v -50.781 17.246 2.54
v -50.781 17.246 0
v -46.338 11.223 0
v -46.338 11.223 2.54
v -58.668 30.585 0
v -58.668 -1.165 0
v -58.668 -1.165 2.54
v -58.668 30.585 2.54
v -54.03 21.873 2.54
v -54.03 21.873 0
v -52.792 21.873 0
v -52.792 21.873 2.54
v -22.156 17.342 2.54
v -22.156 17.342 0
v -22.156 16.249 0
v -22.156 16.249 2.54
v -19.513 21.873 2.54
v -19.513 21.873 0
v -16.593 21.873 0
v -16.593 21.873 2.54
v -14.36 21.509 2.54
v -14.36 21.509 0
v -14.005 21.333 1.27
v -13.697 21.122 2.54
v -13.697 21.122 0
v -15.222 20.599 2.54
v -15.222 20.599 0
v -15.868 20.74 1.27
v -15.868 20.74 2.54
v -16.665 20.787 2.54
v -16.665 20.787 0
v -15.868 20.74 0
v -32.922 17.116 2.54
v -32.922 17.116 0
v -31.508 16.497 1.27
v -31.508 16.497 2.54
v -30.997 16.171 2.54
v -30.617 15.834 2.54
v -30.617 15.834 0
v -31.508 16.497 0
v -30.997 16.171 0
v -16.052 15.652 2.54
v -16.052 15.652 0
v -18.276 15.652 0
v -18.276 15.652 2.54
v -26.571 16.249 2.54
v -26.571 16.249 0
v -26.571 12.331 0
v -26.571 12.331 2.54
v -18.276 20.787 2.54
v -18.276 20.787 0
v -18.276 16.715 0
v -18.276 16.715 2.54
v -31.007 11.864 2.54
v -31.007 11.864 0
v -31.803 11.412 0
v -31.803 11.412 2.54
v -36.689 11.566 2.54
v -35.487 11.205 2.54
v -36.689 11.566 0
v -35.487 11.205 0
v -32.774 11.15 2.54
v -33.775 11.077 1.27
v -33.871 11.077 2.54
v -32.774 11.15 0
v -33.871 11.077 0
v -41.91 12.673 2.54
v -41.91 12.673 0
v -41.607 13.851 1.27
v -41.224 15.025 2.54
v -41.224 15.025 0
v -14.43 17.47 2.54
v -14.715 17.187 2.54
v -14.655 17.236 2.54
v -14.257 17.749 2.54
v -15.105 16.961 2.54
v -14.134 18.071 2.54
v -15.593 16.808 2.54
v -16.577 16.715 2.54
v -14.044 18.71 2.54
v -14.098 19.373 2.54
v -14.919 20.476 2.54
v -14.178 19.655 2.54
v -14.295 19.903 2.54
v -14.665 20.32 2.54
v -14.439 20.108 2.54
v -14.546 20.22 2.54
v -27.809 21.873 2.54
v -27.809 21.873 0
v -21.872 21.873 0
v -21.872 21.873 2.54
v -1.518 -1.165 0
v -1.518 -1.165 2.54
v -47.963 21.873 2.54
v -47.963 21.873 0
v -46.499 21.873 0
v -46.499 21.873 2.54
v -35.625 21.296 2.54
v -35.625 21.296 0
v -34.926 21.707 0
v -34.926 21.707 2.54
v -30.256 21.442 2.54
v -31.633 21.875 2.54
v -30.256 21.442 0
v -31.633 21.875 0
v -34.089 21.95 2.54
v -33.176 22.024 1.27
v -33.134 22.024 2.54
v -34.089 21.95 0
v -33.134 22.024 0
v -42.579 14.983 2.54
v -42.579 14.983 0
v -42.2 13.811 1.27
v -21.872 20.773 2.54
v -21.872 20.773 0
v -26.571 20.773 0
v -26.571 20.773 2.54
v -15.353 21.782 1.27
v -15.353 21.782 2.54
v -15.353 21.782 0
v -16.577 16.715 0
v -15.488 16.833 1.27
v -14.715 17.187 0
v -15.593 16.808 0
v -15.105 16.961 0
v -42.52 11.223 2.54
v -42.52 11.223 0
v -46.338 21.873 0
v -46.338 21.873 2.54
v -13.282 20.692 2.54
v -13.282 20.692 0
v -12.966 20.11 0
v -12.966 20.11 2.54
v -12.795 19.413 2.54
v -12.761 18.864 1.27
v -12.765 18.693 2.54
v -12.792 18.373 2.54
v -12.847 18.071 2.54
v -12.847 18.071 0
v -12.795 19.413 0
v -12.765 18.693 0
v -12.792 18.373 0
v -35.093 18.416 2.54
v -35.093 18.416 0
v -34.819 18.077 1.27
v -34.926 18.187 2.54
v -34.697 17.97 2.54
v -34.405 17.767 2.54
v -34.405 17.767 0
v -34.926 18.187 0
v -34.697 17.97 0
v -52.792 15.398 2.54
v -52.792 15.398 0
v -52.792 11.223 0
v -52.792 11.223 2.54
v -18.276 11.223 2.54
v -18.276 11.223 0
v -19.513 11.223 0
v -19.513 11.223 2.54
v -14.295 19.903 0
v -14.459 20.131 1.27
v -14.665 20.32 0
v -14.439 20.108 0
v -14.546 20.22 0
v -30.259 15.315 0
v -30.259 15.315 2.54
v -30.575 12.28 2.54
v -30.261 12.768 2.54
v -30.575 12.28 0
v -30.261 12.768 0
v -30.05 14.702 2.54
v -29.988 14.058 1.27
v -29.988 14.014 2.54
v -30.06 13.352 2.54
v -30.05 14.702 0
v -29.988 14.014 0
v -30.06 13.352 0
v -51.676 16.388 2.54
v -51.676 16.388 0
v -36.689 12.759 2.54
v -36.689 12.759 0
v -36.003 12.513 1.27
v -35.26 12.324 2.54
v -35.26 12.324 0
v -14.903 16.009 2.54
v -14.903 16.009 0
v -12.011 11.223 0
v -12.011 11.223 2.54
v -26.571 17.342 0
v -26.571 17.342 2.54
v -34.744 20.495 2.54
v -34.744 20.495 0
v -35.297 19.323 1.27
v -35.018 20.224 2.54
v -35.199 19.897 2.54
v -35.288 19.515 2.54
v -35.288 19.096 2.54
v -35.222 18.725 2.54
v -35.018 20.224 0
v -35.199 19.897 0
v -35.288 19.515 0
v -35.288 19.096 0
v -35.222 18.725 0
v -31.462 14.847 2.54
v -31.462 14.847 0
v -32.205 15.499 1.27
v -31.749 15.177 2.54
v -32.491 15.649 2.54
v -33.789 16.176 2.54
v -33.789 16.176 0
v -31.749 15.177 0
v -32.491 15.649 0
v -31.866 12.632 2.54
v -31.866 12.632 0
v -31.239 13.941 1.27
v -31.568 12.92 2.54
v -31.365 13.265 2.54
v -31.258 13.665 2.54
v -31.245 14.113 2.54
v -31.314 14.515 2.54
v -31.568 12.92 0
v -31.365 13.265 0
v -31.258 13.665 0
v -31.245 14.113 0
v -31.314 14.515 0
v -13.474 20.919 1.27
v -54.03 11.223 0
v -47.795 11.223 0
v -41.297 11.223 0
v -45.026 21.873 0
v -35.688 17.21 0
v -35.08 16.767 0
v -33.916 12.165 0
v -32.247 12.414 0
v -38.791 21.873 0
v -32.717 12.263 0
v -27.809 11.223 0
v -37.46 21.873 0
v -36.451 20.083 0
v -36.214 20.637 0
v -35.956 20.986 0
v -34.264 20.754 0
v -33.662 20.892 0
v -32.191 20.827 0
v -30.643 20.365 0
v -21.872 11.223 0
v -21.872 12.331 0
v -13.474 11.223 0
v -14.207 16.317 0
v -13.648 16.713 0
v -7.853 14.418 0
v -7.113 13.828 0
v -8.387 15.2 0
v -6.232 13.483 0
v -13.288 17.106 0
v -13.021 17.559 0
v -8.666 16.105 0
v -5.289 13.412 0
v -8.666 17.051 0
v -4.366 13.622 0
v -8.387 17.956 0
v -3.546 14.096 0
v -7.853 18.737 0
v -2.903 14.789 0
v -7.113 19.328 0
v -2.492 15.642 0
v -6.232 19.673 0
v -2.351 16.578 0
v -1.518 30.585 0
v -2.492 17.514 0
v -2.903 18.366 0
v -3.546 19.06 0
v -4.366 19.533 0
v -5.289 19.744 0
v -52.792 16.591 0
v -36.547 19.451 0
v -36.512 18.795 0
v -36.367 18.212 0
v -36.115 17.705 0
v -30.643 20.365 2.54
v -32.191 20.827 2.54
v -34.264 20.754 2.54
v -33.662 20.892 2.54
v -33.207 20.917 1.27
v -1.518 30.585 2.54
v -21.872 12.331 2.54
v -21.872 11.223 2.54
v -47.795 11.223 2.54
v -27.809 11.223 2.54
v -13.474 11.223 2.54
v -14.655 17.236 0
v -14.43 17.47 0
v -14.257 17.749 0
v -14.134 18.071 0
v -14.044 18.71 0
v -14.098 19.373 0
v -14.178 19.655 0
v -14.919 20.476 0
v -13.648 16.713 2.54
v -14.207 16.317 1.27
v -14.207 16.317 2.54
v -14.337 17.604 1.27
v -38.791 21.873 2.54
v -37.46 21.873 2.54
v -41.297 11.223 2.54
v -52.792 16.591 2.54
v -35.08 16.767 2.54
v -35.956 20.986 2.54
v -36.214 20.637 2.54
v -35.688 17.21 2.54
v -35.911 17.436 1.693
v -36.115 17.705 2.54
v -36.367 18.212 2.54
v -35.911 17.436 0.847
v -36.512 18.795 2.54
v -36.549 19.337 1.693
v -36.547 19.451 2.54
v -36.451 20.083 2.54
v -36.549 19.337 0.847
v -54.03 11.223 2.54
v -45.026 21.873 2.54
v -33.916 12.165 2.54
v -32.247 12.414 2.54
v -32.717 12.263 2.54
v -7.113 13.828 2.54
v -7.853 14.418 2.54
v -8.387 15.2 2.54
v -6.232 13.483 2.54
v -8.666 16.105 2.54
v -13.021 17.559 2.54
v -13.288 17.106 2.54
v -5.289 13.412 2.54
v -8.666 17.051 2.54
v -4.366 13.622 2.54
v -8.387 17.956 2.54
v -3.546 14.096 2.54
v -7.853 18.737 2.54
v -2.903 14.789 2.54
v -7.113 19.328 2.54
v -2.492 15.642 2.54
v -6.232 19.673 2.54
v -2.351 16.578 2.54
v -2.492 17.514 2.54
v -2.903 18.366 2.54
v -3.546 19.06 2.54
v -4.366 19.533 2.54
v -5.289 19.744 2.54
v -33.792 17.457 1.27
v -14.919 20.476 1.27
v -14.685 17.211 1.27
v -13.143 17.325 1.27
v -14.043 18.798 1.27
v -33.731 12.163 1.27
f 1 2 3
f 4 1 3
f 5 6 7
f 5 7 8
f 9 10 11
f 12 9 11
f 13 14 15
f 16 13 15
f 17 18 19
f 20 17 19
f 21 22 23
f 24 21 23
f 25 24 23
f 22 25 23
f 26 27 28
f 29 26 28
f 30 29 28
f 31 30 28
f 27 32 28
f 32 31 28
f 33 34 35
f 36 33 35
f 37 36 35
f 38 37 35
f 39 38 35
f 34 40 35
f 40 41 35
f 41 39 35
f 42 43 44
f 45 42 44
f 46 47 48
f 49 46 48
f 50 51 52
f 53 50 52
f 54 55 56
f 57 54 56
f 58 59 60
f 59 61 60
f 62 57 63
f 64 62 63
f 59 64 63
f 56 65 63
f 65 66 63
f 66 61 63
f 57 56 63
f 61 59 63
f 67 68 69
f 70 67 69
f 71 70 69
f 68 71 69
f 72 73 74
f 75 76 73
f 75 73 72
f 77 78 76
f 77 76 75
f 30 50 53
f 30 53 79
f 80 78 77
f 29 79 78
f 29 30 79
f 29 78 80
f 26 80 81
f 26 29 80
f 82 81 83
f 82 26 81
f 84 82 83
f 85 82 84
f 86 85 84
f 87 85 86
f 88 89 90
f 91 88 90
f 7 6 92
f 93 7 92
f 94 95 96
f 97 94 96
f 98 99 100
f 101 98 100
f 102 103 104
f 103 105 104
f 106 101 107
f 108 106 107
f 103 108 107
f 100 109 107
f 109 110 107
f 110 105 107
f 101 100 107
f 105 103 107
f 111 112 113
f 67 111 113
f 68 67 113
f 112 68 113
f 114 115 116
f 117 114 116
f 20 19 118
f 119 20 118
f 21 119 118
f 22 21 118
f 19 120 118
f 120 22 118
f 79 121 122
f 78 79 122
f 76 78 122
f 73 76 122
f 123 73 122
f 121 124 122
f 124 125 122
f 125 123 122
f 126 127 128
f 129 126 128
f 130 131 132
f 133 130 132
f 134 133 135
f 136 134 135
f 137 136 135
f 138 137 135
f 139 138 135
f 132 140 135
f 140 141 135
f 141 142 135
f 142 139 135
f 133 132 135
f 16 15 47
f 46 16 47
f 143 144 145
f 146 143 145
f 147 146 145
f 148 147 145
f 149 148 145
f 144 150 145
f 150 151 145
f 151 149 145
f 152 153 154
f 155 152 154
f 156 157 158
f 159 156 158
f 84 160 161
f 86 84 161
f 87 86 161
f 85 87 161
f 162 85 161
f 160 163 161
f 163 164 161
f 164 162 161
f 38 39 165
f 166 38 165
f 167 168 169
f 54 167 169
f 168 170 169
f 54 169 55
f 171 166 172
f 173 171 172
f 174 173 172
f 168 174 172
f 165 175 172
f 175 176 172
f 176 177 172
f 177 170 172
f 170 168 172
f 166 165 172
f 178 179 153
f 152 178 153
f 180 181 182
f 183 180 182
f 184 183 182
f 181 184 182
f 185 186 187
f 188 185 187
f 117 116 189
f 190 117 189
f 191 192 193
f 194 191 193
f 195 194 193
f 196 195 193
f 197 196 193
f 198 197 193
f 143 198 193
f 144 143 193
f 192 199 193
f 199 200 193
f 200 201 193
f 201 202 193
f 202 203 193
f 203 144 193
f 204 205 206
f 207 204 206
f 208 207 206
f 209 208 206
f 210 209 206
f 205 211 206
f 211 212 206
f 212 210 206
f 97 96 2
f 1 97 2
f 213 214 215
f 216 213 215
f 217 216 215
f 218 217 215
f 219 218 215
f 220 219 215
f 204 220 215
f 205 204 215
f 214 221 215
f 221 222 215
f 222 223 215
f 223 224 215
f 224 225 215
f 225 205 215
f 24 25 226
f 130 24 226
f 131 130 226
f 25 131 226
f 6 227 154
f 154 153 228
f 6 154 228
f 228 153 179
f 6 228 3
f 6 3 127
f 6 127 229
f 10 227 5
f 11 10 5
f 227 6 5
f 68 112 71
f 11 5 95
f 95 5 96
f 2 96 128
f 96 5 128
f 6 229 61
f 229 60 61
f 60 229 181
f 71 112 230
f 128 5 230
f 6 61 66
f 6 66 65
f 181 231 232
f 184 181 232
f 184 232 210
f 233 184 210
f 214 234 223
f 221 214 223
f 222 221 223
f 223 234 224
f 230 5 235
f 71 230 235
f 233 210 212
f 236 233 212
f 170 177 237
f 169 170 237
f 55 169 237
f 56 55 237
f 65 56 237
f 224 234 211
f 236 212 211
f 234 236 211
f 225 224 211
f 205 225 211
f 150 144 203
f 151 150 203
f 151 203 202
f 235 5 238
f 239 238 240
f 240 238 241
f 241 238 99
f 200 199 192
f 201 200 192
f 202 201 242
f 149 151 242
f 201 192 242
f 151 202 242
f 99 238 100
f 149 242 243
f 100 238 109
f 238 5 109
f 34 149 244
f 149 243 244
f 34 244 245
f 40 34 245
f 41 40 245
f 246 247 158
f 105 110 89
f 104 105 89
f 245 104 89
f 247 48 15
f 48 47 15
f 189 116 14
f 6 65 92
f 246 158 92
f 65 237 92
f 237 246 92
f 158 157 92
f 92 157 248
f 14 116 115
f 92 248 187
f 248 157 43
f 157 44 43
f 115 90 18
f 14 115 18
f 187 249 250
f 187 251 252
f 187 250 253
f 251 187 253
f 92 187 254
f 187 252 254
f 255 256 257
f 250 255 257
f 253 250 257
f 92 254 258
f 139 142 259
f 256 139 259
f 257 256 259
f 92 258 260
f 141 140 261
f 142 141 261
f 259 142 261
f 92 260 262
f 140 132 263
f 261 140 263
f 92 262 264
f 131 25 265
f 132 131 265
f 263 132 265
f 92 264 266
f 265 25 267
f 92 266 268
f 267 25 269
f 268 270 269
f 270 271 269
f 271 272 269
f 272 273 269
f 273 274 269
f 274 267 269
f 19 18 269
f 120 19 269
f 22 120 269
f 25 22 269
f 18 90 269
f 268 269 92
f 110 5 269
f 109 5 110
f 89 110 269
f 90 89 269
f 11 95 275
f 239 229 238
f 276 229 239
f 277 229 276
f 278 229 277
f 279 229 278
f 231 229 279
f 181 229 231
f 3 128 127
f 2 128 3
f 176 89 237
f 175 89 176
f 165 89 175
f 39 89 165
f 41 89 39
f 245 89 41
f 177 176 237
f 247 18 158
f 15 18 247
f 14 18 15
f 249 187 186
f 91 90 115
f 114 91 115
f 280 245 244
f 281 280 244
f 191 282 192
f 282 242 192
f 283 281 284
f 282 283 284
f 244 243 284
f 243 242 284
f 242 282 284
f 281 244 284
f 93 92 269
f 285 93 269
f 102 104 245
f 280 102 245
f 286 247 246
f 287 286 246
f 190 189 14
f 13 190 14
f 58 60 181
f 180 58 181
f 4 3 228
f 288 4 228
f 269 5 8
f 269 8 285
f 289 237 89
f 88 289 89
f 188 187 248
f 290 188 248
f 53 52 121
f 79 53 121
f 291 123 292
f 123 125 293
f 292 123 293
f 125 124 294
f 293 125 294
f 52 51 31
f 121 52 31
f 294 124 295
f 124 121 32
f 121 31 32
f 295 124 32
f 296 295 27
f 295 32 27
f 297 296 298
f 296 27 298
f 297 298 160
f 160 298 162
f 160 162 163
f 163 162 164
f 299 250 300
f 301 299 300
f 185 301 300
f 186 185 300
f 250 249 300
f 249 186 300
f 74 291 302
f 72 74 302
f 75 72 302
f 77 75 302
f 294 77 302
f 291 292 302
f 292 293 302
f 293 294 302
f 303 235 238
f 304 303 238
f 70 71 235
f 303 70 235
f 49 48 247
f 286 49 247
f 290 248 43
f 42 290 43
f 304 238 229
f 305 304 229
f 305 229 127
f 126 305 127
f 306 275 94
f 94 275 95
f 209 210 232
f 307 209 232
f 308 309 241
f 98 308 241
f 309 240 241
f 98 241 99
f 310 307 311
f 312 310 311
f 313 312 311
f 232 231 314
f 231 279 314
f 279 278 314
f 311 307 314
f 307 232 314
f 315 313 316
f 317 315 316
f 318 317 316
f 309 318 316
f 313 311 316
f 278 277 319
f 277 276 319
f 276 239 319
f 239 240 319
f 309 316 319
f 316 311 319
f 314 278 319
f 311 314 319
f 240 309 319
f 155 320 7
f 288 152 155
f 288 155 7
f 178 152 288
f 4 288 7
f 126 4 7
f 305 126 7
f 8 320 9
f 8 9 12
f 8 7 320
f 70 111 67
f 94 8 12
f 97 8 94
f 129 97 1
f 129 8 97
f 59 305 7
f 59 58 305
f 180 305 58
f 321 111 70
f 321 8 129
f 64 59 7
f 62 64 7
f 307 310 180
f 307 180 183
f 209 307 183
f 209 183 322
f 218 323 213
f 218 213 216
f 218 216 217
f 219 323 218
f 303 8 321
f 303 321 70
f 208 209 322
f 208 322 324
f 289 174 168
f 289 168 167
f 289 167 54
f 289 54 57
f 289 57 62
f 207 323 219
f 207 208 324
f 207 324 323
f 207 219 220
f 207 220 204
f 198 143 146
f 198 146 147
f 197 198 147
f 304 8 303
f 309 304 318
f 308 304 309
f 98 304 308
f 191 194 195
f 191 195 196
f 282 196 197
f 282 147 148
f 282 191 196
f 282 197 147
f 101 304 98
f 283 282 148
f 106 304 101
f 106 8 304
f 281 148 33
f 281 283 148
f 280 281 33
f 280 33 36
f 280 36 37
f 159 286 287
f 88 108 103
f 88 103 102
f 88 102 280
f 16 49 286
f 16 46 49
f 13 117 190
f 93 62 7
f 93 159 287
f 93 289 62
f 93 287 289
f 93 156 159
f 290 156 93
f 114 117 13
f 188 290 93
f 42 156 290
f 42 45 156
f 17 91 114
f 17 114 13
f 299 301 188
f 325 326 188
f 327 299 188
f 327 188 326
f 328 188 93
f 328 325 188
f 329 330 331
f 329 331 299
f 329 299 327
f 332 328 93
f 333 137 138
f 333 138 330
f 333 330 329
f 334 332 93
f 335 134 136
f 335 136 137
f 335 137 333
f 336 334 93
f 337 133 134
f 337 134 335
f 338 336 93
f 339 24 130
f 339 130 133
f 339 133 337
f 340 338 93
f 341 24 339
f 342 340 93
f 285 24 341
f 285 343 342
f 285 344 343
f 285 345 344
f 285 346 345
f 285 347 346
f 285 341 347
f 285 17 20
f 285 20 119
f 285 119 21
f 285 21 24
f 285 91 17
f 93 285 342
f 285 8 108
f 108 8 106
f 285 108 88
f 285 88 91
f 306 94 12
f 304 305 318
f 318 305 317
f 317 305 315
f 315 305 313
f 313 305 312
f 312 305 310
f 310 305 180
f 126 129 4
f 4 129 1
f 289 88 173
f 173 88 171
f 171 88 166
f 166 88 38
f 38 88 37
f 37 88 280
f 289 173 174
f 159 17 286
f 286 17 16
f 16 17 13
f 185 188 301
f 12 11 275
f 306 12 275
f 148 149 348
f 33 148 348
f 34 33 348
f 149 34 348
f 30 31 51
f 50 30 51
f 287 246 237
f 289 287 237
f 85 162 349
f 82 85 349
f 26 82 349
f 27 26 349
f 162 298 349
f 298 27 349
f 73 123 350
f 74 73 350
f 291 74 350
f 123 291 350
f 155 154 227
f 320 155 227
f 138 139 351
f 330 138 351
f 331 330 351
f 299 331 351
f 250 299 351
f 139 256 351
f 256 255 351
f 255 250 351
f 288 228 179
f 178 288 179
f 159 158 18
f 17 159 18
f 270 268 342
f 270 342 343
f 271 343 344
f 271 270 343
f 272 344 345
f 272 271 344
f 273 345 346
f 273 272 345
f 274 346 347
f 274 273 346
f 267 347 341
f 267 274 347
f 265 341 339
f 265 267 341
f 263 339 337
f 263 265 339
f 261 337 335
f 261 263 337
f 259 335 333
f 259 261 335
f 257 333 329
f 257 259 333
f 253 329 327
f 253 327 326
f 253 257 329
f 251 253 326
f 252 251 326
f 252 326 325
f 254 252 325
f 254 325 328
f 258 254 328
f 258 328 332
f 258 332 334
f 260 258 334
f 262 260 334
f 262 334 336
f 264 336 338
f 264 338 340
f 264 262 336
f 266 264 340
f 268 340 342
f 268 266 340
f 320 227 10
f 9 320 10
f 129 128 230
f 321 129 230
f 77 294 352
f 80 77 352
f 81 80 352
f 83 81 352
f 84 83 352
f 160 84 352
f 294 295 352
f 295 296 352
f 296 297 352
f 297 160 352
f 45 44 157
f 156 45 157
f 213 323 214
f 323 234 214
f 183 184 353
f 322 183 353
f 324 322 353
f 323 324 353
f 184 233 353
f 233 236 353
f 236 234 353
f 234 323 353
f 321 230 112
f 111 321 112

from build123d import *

# Parameters (mm, degrees)
F1_DEPTH = 2.54
F0_W     = 57.15
F0_H     = 31.75
F0_R     = 3.175


with BuildPart() as f1:
    # F0 (on Top) → F1 (new body)
    with BuildSketch(Plane.XY):
        with BuildLine():
            Line((-18.2756781968, 20.786606901), (-18.2756781968, 19.4800253958))
            Line((-18.2756781968, 19.4800253958), (-18.2756781968, 18.3623470366))
            Line((-18.2756781968, 18.3623470366), (-18.2756781968, 16.7147622153))
            Line((-18.2756781968, 16.7147622153), (-16.5765512501, 16.7147622153))
            add(Edge.make_bspline(
                [(-16.5765512501, 16.7147622153), (-15.3293934084, 16.7147622153), (-14.7150388735, 17.1869877213)],
                knots=[0, 0, 0, 0.9521092994, 0.9521092994, 0.9521092994], degree=2))
            add(Edge.make_bspline(
                [(-14.7150388735, 17.1869877213), (-14.6841370967, 17.2107404673), (-14.6548363426, 17.2356879665)],
                knots=[0.9521092994, 0.9521092994, 0.9521092994, 1, 1, 1], degree=2))
            add(Edge.make_bspline(
                [(-14.6548363426, 17.2356879665), (-14.2795364488, 17.555229019), (-14.1344492538, 18.0707797408)],
                knots=[0, 0, 0, 0.613409976, 0.613409976, 0.613409976], degree=2))
            add(Edge.make_bspline(
                [(-14.1344492538, 18.0707797408), (-14.043010796, 18.3956958226), (-14.043010796, 18.7984652199)],
                knots=[0.613409976, 0.613409976, 0.613409976, 1, 1, 1], degree=2))
            add(Edge.make_bspline(
                [(-14.043010796, 18.7984652199), (-14.043010796, 19.4699240171), (-14.2946946146, 19.9028959001)],
                knots=[0, 0, 0, 0.6359498468, 0.6359498468, 0.6359498468], degree=2))
            add(Edge.make_bspline(
                [(-14.2946946146, 19.9028959001), (-14.4387712791, 20.1507511062), (-14.6653247806, 20.3204541035)],
                knots=[0.6359498468, 0.6359498468, 0.6359498468, 1, 1, 1], degree=2))
            add(Edge.make_bspline(
                [(-14.6653247806, 20.3204541035), (-14.8932302371, 20.4911698013), (-15.2224180123, 20.5993655494)],
                knots=[0, 0, 0, 0.3662226179, 0.3662226179, 0.3662226179], degree=2))
            add(Edge.make_bspline(
                [(-15.2224180123, 20.5993655494), (-15.7921036522, 20.786606901), (-16.6651202816, 20.786606901)],
                knots=[0.3662226179, 0.3662226179, 0.3662226179, 1, 1, 1], degree=2))
            Line((-16.6651202816, 20.786606901), (-18.2756781968, 20.786606901))
        make_face()
    extrude(amount=F1_DEPTH)


with BuildPart() as f1b:
    # F0 (on Top) → F1, piece 2 (new body)
    with BuildSketch(Plane.XY):
        with Locations((-30.0933175445, 14.7100100294)):
            Rectangle(F0_W, F0_H)
        Polygon((-50.7805127623, 17.2461764044), (-46.3380766027, 11.2234822615), (-47.7948040947, 11.2234822615), (-51.6755261334, 16.3884552571), (-52.7919620833, 15.3978805626), (-52.7919620833, 11.2234822615), (-54.0295977605, 11.2234822615), (-54.0295977605, 21.872742919), (-52.7919620833, 21.872742919), (-52.7919620833, 16.591231724), (-47.9626191018, 21.872742919), (-46.4988993178, 21.872742919), align=None, mode=Mode.SUBTRACT)
        with BuildLine():
            Line((-41.2243804148, 15.0249583246), (-38.7910628121, 21.872742919))
            Line((-38.7910628121, 21.872742919), (-37.4601965754, 21.872742919))
            Line((-37.4601965754, 21.872742919), (-41.2966340984, 11.2234822615))
            Line((-41.2966340984, 11.2234822615), (-42.5202851917, 11.2234822615))
            Line((-42.5202851917, 11.2234822615), (-46.3380766027, 21.872742919))
            Line((-46.3380766027, 21.872742919), (-45.0258564779, 21.872742919))
            Line((-45.0258564779, 21.872742919), (-42.5785542914, 14.9830045728))
            add(Edge.make_bspline(
                [(-42.5785542914, 14.9830045728), (-42.1566860097, 13.7943149394), (-41.909625027, 12.6732174615)],
                knots=[0, 0, 0, 1, 1, 1], degree=2))
            add(Edge.make_bspline(
                [(-41.909625027, 12.6732174615), (-41.6462486965, 13.852584039), (-41.2243804148, 15.0249583246)],
                knots=[0, 0, 0, 1, 1, 1], degree=2))
        make_face(mode=Mode.SUBTRACT)
        with BuildLine():
            add(Edge.make_bspline(
                [(-30.617073509, 15.8337334282), (-29.9877672325, 15.1484888159), (-29.9877672325, 14.0576912699)],
                knots=[0, 0, 0, 1, 1, 1], degree=2))
            add(Edge.make_bspline(
                [(-29.9877672325, 14.0576912699), (-29.9877672325, 12.6522405856), (-31.0074764769, 11.8644423579)],
                knots=[0, 0, 0, 1, 1, 1], degree=2))
            add(Edge.make_bspline(
                [(-31.0074764769, 11.8644423579), (-32.0271857213, 11.0766441303), (-33.7752587117, 11.0766441303)],
                knots=[0, 0, 0, 1, 1, 1], degree=2))
            add(Edge.make_bspline(
                [(-33.7752587117, 11.0766441303), (-35.6678390693, 11.0766441303), (-36.6887136957, 11.5661045676)],
                knots=[0, 0, 0, 1, 1, 1], degree=2))
            Line((-36.6887136957, 11.5661045676), (-36.6887136957, 12.759455729))
            add(Edge.make_bspline(
                [(-36.6887136957, 12.759455729), (-36.0314382513, 12.4844255785), (-35.2599553715, 12.3236028634)],
                knots=[0, 0, 0, 1, 1, 1], degree=2))
            add(Edge.make_bspline(
                [(-35.2599553715, 12.3236028634), (-34.4884724918, 12.1627801483), (-33.7309741959, 12.1627801483)],
                knots=[0, 0, 0, 1, 1, 1], degree=2))
            add(Edge.make_bspline(
                [(-33.7309741959, 12.1627801483), (-32.4933385187, 12.1627801483), (-31.8663630062, 12.6324290917)],
                knots=[0, 0, 0, 1, 1, 1], degree=2))
            add(Edge.make_bspline(
                [(-31.8663630062, 12.6324290917), (-31.2393874936, 13.1020780352), (-31.2393874936, 13.9411530705)],
                knots=[0, 0, 0, 1, 1, 1], degree=2))
            add(Edge.make_bspline(
                [(-31.2393874936, 13.9411530705), (-31.2393874936, 14.4935441355), (-31.4619754544, 14.8466548796)],
                knots=[0, 0, 0, 1, 1, 1], degree=2))
            add(Edge.make_bspline(
                [(-31.4619754544, 14.8466548796), (-31.6845634152, 15.1997656236), (-32.2054891663, 15.499268796)],
                knots=[0, 0, 0, 1, 1, 1], degree=2))
            add(Edge.make_bspline(
                [(-32.2054891663, 15.499268796), (-32.7264149174, 15.7987719684), (-33.7892432956, 16.1763557343)],
                knots=[0, 0, 0, 1, 1, 1], degree=2))
            add(Edge.make_bspline(
                [(-33.7892432956, 16.1763557343), (-35.2739399555, 16.7077699234), (-35.911403906, 17.4361336694)],
                knots=[0, 0, 0, 1, 1, 1], degree=2))
            add(Edge.make_bspline(
                [(-35.911403906, 17.4361336694), (-36.5488678565, 18.1644974154), (-36.5488678565, 19.3368717009)],
                knots=[0, 0, 0, 1, 1, 1], degree=2))
            add(Edge.make_bspline(
                [(-36.5488678565, 19.3368717009), (-36.5488678565, 20.5675150862), (-35.6247199355, 21.2958788322)],
                knots=[0, 0, 0, 1, 1, 1], degree=2))
            add(Edge.make_bspline(
                [(-35.6247199355, 21.2958788322), (-34.7005720146, 22.0242425782), (-33.176252367, 22.0242425782)],
                knots=[0, 0, 0, 1, 1, 1], degree=2))
            add(Edge.make_bspline(
                [(-33.176252367, 22.0242425782), (-31.5890020917, 22.0242425782), (-30.255805091, 21.4415515814)],
                knots=[0, 0, 0, 1, 1, 1], degree=2))
            Line((-30.255805091, 21.4415515814), (-30.6427119129, 20.3647386193))
            add(Edge.make_bspline(
                [(-30.6427119129, 20.3647386193), (-31.9619243296, 20.9171296843), (-33.2065522988, 20.9171296843)],
                knots=[0, 0, 0, 1, 1, 1], degree=2))
            add(Edge.make_bspline(
                [(-33.2065522988, 20.9171296843), (-34.1901347014, 20.9171296843), (-34.7436911484, 20.4952614026)],
                knots=[0, 0, 0, 1, 1, 1], degree=2))
            add(Edge.make_bspline(
                [(-34.7436911484, 20.4952614026), (-35.2972475953, 20.0733931209), (-35.2972475953, 19.322887117)],
                knots=[0, 0, 0, 1, 1, 1], degree=2))
            add(Edge.make_bspline(
                [(-35.2972475953, 19.322887117), (-35.2972475953, 18.770496052), (-35.0933057464, 18.416219926)],
                knots=[0, 0, 0, 1, 1, 1], degree=2))
            add(Edge.make_bspline(
                [(-35.0933057464, 18.416219926), (-34.8893638976, 18.0619437999), (-34.4045649882, 17.7671021555)],
                knots=[0, 0, 0, 1, 1, 1], degree=2))
            add(Edge.make_bspline(
                [(-34.4045649882, 17.7671021555), (-33.9197660789, 17.4722605112), (-32.9221990924, 17.1156536211)],
                knots=[0, 0, 0, 1, 1, 1], degree=2))
            add(Edge.make_bspline(
                [(-32.9221990924, 17.1156536211), (-31.2463797856, 16.5189780404), (-30.617073509, 15.8337334282)],
                knots=[0, 0, 0, 1, 1, 1], degree=2))
        make_face(mode=Mode.SUBTRACT)
        Polygon((-21.872047029, 12.3305951554), (-21.872047029, 11.2234822615), (-27.8085029044, 11.2234822615), (-27.8085029044, 21.872742919), (-21.872047029, 21.872742919), (-21.872047029, 20.772622317), (-26.5708672272, 20.772622317), (-26.5708672272, 17.3417377279), (-22.1564002355, 17.3417377279), (-22.1564002355, 16.2486094179), (-26.5708672272, 16.2486094179), (-26.5708672272, 12.3305951554), align=None, mode=Mode.SUBTRACT)
        with BuildLine():
            Line((-19.513313874, 18.3623470366), (-19.513313874, 19.4800253958))
            Line((-19.513313874, 19.4800253958), (-19.513313874, 21.872742919))
            Line((-19.513313874, 21.872742919), (-16.592866598, 21.872742919))
            add(Edge.make_bspline(
                [(-16.592866598, 21.872742919), (-15.2285621267, 21.872742919), (-14.3604969989, 21.509172797)],
                knots=[0, 0, 0, 0.696012449, 0.696012449, 0.696012449], degree=2))
            add(Edge.make_bspline(
                [(-14.3604969989, 21.509172797), (-13.9813644234, 21.3503813973), (-13.6968923439, 21.1222369151)],
                knots=[0.696012449, 0.696012449, 0.696012449, 1, 1, 1], degree=2))
            add(Edge.make_bspline(
                [(-13.6968923439, 21.1222369151), (-13.458971, 20.9314257751), (-13.2815395692, 20.6916501974)],
                knots=[0, 0, 0, 0.2542433226, 0.2542433226, 0.2542433226], degree=2))
            add(Edge.make_bspline(
                [(-13.2815395692, 20.6916501974), (-12.761090603, 19.9883308877), (-12.761090603, 18.8637266115)],
                knots=[0.2542433226, 0.2542433226, 0.2542433226, 1, 1, 1], degree=2))
            add(Edge.make_bspline(
                [(-12.761090603, 18.8637266115), (-12.761090603, 18.4396658515), (-12.8474713572, 18.0707797408)],
                knots=[0, 0, 0, 0.2008175159, 0.2008175159, 0.2008175159], degree=2))
            add(Edge.make_bspline(
                [(-12.8474713572, 18.0707797408), (-13.0378542721, 17.2577558946), (-13.6478405422, 16.7127485549)],
                knots=[0.2008175159, 0.2008175159, 0.2008175159, 0.6434186993, 0.6434186993, 0.6434186993], degree=2))
            add(Edge.make_bspline(
                [(-13.6478405422, 16.7127485549), (-14.1392755083, 16.2736638137), (-14.9030627073, 16.0085407272)],
                knots=[0.6434186993, 0.6434186993, 0.6434186993, 1, 1, 1], degree=2))
            Line((-14.9030627073, 16.0085407272), (-12.0105845992, 11.2234822615))
            Line((-12.0105845992, 11.2234822615), (-13.4743043831, 11.2234822615))
            Line((-13.4743043831, 11.2234822615), (-16.052129353, 15.6519338372))
            Line((-16.052129353, 15.6519338372), (-18.2756781968, 15.6519338372))
            Line((-18.2756781968, 15.6519338372), (-18.2756781968, 11.2234822615))
            Line((-18.2756781968, 11.2234822615), (-19.513313874, 11.2234822615))
            Line((-19.513313874, 11.2234822615), (-19.513313874, 18.3623470366))
        make_face(mode=Mode.SUBTRACT)
        with Locations((-5.525982473, 16.5779478848)):
            Circle(F0_R, mode=Mode.SUBTRACT)
    extrude(amount=F1_DEPTH)


solid = Compound([f1.part, f1b.part])
